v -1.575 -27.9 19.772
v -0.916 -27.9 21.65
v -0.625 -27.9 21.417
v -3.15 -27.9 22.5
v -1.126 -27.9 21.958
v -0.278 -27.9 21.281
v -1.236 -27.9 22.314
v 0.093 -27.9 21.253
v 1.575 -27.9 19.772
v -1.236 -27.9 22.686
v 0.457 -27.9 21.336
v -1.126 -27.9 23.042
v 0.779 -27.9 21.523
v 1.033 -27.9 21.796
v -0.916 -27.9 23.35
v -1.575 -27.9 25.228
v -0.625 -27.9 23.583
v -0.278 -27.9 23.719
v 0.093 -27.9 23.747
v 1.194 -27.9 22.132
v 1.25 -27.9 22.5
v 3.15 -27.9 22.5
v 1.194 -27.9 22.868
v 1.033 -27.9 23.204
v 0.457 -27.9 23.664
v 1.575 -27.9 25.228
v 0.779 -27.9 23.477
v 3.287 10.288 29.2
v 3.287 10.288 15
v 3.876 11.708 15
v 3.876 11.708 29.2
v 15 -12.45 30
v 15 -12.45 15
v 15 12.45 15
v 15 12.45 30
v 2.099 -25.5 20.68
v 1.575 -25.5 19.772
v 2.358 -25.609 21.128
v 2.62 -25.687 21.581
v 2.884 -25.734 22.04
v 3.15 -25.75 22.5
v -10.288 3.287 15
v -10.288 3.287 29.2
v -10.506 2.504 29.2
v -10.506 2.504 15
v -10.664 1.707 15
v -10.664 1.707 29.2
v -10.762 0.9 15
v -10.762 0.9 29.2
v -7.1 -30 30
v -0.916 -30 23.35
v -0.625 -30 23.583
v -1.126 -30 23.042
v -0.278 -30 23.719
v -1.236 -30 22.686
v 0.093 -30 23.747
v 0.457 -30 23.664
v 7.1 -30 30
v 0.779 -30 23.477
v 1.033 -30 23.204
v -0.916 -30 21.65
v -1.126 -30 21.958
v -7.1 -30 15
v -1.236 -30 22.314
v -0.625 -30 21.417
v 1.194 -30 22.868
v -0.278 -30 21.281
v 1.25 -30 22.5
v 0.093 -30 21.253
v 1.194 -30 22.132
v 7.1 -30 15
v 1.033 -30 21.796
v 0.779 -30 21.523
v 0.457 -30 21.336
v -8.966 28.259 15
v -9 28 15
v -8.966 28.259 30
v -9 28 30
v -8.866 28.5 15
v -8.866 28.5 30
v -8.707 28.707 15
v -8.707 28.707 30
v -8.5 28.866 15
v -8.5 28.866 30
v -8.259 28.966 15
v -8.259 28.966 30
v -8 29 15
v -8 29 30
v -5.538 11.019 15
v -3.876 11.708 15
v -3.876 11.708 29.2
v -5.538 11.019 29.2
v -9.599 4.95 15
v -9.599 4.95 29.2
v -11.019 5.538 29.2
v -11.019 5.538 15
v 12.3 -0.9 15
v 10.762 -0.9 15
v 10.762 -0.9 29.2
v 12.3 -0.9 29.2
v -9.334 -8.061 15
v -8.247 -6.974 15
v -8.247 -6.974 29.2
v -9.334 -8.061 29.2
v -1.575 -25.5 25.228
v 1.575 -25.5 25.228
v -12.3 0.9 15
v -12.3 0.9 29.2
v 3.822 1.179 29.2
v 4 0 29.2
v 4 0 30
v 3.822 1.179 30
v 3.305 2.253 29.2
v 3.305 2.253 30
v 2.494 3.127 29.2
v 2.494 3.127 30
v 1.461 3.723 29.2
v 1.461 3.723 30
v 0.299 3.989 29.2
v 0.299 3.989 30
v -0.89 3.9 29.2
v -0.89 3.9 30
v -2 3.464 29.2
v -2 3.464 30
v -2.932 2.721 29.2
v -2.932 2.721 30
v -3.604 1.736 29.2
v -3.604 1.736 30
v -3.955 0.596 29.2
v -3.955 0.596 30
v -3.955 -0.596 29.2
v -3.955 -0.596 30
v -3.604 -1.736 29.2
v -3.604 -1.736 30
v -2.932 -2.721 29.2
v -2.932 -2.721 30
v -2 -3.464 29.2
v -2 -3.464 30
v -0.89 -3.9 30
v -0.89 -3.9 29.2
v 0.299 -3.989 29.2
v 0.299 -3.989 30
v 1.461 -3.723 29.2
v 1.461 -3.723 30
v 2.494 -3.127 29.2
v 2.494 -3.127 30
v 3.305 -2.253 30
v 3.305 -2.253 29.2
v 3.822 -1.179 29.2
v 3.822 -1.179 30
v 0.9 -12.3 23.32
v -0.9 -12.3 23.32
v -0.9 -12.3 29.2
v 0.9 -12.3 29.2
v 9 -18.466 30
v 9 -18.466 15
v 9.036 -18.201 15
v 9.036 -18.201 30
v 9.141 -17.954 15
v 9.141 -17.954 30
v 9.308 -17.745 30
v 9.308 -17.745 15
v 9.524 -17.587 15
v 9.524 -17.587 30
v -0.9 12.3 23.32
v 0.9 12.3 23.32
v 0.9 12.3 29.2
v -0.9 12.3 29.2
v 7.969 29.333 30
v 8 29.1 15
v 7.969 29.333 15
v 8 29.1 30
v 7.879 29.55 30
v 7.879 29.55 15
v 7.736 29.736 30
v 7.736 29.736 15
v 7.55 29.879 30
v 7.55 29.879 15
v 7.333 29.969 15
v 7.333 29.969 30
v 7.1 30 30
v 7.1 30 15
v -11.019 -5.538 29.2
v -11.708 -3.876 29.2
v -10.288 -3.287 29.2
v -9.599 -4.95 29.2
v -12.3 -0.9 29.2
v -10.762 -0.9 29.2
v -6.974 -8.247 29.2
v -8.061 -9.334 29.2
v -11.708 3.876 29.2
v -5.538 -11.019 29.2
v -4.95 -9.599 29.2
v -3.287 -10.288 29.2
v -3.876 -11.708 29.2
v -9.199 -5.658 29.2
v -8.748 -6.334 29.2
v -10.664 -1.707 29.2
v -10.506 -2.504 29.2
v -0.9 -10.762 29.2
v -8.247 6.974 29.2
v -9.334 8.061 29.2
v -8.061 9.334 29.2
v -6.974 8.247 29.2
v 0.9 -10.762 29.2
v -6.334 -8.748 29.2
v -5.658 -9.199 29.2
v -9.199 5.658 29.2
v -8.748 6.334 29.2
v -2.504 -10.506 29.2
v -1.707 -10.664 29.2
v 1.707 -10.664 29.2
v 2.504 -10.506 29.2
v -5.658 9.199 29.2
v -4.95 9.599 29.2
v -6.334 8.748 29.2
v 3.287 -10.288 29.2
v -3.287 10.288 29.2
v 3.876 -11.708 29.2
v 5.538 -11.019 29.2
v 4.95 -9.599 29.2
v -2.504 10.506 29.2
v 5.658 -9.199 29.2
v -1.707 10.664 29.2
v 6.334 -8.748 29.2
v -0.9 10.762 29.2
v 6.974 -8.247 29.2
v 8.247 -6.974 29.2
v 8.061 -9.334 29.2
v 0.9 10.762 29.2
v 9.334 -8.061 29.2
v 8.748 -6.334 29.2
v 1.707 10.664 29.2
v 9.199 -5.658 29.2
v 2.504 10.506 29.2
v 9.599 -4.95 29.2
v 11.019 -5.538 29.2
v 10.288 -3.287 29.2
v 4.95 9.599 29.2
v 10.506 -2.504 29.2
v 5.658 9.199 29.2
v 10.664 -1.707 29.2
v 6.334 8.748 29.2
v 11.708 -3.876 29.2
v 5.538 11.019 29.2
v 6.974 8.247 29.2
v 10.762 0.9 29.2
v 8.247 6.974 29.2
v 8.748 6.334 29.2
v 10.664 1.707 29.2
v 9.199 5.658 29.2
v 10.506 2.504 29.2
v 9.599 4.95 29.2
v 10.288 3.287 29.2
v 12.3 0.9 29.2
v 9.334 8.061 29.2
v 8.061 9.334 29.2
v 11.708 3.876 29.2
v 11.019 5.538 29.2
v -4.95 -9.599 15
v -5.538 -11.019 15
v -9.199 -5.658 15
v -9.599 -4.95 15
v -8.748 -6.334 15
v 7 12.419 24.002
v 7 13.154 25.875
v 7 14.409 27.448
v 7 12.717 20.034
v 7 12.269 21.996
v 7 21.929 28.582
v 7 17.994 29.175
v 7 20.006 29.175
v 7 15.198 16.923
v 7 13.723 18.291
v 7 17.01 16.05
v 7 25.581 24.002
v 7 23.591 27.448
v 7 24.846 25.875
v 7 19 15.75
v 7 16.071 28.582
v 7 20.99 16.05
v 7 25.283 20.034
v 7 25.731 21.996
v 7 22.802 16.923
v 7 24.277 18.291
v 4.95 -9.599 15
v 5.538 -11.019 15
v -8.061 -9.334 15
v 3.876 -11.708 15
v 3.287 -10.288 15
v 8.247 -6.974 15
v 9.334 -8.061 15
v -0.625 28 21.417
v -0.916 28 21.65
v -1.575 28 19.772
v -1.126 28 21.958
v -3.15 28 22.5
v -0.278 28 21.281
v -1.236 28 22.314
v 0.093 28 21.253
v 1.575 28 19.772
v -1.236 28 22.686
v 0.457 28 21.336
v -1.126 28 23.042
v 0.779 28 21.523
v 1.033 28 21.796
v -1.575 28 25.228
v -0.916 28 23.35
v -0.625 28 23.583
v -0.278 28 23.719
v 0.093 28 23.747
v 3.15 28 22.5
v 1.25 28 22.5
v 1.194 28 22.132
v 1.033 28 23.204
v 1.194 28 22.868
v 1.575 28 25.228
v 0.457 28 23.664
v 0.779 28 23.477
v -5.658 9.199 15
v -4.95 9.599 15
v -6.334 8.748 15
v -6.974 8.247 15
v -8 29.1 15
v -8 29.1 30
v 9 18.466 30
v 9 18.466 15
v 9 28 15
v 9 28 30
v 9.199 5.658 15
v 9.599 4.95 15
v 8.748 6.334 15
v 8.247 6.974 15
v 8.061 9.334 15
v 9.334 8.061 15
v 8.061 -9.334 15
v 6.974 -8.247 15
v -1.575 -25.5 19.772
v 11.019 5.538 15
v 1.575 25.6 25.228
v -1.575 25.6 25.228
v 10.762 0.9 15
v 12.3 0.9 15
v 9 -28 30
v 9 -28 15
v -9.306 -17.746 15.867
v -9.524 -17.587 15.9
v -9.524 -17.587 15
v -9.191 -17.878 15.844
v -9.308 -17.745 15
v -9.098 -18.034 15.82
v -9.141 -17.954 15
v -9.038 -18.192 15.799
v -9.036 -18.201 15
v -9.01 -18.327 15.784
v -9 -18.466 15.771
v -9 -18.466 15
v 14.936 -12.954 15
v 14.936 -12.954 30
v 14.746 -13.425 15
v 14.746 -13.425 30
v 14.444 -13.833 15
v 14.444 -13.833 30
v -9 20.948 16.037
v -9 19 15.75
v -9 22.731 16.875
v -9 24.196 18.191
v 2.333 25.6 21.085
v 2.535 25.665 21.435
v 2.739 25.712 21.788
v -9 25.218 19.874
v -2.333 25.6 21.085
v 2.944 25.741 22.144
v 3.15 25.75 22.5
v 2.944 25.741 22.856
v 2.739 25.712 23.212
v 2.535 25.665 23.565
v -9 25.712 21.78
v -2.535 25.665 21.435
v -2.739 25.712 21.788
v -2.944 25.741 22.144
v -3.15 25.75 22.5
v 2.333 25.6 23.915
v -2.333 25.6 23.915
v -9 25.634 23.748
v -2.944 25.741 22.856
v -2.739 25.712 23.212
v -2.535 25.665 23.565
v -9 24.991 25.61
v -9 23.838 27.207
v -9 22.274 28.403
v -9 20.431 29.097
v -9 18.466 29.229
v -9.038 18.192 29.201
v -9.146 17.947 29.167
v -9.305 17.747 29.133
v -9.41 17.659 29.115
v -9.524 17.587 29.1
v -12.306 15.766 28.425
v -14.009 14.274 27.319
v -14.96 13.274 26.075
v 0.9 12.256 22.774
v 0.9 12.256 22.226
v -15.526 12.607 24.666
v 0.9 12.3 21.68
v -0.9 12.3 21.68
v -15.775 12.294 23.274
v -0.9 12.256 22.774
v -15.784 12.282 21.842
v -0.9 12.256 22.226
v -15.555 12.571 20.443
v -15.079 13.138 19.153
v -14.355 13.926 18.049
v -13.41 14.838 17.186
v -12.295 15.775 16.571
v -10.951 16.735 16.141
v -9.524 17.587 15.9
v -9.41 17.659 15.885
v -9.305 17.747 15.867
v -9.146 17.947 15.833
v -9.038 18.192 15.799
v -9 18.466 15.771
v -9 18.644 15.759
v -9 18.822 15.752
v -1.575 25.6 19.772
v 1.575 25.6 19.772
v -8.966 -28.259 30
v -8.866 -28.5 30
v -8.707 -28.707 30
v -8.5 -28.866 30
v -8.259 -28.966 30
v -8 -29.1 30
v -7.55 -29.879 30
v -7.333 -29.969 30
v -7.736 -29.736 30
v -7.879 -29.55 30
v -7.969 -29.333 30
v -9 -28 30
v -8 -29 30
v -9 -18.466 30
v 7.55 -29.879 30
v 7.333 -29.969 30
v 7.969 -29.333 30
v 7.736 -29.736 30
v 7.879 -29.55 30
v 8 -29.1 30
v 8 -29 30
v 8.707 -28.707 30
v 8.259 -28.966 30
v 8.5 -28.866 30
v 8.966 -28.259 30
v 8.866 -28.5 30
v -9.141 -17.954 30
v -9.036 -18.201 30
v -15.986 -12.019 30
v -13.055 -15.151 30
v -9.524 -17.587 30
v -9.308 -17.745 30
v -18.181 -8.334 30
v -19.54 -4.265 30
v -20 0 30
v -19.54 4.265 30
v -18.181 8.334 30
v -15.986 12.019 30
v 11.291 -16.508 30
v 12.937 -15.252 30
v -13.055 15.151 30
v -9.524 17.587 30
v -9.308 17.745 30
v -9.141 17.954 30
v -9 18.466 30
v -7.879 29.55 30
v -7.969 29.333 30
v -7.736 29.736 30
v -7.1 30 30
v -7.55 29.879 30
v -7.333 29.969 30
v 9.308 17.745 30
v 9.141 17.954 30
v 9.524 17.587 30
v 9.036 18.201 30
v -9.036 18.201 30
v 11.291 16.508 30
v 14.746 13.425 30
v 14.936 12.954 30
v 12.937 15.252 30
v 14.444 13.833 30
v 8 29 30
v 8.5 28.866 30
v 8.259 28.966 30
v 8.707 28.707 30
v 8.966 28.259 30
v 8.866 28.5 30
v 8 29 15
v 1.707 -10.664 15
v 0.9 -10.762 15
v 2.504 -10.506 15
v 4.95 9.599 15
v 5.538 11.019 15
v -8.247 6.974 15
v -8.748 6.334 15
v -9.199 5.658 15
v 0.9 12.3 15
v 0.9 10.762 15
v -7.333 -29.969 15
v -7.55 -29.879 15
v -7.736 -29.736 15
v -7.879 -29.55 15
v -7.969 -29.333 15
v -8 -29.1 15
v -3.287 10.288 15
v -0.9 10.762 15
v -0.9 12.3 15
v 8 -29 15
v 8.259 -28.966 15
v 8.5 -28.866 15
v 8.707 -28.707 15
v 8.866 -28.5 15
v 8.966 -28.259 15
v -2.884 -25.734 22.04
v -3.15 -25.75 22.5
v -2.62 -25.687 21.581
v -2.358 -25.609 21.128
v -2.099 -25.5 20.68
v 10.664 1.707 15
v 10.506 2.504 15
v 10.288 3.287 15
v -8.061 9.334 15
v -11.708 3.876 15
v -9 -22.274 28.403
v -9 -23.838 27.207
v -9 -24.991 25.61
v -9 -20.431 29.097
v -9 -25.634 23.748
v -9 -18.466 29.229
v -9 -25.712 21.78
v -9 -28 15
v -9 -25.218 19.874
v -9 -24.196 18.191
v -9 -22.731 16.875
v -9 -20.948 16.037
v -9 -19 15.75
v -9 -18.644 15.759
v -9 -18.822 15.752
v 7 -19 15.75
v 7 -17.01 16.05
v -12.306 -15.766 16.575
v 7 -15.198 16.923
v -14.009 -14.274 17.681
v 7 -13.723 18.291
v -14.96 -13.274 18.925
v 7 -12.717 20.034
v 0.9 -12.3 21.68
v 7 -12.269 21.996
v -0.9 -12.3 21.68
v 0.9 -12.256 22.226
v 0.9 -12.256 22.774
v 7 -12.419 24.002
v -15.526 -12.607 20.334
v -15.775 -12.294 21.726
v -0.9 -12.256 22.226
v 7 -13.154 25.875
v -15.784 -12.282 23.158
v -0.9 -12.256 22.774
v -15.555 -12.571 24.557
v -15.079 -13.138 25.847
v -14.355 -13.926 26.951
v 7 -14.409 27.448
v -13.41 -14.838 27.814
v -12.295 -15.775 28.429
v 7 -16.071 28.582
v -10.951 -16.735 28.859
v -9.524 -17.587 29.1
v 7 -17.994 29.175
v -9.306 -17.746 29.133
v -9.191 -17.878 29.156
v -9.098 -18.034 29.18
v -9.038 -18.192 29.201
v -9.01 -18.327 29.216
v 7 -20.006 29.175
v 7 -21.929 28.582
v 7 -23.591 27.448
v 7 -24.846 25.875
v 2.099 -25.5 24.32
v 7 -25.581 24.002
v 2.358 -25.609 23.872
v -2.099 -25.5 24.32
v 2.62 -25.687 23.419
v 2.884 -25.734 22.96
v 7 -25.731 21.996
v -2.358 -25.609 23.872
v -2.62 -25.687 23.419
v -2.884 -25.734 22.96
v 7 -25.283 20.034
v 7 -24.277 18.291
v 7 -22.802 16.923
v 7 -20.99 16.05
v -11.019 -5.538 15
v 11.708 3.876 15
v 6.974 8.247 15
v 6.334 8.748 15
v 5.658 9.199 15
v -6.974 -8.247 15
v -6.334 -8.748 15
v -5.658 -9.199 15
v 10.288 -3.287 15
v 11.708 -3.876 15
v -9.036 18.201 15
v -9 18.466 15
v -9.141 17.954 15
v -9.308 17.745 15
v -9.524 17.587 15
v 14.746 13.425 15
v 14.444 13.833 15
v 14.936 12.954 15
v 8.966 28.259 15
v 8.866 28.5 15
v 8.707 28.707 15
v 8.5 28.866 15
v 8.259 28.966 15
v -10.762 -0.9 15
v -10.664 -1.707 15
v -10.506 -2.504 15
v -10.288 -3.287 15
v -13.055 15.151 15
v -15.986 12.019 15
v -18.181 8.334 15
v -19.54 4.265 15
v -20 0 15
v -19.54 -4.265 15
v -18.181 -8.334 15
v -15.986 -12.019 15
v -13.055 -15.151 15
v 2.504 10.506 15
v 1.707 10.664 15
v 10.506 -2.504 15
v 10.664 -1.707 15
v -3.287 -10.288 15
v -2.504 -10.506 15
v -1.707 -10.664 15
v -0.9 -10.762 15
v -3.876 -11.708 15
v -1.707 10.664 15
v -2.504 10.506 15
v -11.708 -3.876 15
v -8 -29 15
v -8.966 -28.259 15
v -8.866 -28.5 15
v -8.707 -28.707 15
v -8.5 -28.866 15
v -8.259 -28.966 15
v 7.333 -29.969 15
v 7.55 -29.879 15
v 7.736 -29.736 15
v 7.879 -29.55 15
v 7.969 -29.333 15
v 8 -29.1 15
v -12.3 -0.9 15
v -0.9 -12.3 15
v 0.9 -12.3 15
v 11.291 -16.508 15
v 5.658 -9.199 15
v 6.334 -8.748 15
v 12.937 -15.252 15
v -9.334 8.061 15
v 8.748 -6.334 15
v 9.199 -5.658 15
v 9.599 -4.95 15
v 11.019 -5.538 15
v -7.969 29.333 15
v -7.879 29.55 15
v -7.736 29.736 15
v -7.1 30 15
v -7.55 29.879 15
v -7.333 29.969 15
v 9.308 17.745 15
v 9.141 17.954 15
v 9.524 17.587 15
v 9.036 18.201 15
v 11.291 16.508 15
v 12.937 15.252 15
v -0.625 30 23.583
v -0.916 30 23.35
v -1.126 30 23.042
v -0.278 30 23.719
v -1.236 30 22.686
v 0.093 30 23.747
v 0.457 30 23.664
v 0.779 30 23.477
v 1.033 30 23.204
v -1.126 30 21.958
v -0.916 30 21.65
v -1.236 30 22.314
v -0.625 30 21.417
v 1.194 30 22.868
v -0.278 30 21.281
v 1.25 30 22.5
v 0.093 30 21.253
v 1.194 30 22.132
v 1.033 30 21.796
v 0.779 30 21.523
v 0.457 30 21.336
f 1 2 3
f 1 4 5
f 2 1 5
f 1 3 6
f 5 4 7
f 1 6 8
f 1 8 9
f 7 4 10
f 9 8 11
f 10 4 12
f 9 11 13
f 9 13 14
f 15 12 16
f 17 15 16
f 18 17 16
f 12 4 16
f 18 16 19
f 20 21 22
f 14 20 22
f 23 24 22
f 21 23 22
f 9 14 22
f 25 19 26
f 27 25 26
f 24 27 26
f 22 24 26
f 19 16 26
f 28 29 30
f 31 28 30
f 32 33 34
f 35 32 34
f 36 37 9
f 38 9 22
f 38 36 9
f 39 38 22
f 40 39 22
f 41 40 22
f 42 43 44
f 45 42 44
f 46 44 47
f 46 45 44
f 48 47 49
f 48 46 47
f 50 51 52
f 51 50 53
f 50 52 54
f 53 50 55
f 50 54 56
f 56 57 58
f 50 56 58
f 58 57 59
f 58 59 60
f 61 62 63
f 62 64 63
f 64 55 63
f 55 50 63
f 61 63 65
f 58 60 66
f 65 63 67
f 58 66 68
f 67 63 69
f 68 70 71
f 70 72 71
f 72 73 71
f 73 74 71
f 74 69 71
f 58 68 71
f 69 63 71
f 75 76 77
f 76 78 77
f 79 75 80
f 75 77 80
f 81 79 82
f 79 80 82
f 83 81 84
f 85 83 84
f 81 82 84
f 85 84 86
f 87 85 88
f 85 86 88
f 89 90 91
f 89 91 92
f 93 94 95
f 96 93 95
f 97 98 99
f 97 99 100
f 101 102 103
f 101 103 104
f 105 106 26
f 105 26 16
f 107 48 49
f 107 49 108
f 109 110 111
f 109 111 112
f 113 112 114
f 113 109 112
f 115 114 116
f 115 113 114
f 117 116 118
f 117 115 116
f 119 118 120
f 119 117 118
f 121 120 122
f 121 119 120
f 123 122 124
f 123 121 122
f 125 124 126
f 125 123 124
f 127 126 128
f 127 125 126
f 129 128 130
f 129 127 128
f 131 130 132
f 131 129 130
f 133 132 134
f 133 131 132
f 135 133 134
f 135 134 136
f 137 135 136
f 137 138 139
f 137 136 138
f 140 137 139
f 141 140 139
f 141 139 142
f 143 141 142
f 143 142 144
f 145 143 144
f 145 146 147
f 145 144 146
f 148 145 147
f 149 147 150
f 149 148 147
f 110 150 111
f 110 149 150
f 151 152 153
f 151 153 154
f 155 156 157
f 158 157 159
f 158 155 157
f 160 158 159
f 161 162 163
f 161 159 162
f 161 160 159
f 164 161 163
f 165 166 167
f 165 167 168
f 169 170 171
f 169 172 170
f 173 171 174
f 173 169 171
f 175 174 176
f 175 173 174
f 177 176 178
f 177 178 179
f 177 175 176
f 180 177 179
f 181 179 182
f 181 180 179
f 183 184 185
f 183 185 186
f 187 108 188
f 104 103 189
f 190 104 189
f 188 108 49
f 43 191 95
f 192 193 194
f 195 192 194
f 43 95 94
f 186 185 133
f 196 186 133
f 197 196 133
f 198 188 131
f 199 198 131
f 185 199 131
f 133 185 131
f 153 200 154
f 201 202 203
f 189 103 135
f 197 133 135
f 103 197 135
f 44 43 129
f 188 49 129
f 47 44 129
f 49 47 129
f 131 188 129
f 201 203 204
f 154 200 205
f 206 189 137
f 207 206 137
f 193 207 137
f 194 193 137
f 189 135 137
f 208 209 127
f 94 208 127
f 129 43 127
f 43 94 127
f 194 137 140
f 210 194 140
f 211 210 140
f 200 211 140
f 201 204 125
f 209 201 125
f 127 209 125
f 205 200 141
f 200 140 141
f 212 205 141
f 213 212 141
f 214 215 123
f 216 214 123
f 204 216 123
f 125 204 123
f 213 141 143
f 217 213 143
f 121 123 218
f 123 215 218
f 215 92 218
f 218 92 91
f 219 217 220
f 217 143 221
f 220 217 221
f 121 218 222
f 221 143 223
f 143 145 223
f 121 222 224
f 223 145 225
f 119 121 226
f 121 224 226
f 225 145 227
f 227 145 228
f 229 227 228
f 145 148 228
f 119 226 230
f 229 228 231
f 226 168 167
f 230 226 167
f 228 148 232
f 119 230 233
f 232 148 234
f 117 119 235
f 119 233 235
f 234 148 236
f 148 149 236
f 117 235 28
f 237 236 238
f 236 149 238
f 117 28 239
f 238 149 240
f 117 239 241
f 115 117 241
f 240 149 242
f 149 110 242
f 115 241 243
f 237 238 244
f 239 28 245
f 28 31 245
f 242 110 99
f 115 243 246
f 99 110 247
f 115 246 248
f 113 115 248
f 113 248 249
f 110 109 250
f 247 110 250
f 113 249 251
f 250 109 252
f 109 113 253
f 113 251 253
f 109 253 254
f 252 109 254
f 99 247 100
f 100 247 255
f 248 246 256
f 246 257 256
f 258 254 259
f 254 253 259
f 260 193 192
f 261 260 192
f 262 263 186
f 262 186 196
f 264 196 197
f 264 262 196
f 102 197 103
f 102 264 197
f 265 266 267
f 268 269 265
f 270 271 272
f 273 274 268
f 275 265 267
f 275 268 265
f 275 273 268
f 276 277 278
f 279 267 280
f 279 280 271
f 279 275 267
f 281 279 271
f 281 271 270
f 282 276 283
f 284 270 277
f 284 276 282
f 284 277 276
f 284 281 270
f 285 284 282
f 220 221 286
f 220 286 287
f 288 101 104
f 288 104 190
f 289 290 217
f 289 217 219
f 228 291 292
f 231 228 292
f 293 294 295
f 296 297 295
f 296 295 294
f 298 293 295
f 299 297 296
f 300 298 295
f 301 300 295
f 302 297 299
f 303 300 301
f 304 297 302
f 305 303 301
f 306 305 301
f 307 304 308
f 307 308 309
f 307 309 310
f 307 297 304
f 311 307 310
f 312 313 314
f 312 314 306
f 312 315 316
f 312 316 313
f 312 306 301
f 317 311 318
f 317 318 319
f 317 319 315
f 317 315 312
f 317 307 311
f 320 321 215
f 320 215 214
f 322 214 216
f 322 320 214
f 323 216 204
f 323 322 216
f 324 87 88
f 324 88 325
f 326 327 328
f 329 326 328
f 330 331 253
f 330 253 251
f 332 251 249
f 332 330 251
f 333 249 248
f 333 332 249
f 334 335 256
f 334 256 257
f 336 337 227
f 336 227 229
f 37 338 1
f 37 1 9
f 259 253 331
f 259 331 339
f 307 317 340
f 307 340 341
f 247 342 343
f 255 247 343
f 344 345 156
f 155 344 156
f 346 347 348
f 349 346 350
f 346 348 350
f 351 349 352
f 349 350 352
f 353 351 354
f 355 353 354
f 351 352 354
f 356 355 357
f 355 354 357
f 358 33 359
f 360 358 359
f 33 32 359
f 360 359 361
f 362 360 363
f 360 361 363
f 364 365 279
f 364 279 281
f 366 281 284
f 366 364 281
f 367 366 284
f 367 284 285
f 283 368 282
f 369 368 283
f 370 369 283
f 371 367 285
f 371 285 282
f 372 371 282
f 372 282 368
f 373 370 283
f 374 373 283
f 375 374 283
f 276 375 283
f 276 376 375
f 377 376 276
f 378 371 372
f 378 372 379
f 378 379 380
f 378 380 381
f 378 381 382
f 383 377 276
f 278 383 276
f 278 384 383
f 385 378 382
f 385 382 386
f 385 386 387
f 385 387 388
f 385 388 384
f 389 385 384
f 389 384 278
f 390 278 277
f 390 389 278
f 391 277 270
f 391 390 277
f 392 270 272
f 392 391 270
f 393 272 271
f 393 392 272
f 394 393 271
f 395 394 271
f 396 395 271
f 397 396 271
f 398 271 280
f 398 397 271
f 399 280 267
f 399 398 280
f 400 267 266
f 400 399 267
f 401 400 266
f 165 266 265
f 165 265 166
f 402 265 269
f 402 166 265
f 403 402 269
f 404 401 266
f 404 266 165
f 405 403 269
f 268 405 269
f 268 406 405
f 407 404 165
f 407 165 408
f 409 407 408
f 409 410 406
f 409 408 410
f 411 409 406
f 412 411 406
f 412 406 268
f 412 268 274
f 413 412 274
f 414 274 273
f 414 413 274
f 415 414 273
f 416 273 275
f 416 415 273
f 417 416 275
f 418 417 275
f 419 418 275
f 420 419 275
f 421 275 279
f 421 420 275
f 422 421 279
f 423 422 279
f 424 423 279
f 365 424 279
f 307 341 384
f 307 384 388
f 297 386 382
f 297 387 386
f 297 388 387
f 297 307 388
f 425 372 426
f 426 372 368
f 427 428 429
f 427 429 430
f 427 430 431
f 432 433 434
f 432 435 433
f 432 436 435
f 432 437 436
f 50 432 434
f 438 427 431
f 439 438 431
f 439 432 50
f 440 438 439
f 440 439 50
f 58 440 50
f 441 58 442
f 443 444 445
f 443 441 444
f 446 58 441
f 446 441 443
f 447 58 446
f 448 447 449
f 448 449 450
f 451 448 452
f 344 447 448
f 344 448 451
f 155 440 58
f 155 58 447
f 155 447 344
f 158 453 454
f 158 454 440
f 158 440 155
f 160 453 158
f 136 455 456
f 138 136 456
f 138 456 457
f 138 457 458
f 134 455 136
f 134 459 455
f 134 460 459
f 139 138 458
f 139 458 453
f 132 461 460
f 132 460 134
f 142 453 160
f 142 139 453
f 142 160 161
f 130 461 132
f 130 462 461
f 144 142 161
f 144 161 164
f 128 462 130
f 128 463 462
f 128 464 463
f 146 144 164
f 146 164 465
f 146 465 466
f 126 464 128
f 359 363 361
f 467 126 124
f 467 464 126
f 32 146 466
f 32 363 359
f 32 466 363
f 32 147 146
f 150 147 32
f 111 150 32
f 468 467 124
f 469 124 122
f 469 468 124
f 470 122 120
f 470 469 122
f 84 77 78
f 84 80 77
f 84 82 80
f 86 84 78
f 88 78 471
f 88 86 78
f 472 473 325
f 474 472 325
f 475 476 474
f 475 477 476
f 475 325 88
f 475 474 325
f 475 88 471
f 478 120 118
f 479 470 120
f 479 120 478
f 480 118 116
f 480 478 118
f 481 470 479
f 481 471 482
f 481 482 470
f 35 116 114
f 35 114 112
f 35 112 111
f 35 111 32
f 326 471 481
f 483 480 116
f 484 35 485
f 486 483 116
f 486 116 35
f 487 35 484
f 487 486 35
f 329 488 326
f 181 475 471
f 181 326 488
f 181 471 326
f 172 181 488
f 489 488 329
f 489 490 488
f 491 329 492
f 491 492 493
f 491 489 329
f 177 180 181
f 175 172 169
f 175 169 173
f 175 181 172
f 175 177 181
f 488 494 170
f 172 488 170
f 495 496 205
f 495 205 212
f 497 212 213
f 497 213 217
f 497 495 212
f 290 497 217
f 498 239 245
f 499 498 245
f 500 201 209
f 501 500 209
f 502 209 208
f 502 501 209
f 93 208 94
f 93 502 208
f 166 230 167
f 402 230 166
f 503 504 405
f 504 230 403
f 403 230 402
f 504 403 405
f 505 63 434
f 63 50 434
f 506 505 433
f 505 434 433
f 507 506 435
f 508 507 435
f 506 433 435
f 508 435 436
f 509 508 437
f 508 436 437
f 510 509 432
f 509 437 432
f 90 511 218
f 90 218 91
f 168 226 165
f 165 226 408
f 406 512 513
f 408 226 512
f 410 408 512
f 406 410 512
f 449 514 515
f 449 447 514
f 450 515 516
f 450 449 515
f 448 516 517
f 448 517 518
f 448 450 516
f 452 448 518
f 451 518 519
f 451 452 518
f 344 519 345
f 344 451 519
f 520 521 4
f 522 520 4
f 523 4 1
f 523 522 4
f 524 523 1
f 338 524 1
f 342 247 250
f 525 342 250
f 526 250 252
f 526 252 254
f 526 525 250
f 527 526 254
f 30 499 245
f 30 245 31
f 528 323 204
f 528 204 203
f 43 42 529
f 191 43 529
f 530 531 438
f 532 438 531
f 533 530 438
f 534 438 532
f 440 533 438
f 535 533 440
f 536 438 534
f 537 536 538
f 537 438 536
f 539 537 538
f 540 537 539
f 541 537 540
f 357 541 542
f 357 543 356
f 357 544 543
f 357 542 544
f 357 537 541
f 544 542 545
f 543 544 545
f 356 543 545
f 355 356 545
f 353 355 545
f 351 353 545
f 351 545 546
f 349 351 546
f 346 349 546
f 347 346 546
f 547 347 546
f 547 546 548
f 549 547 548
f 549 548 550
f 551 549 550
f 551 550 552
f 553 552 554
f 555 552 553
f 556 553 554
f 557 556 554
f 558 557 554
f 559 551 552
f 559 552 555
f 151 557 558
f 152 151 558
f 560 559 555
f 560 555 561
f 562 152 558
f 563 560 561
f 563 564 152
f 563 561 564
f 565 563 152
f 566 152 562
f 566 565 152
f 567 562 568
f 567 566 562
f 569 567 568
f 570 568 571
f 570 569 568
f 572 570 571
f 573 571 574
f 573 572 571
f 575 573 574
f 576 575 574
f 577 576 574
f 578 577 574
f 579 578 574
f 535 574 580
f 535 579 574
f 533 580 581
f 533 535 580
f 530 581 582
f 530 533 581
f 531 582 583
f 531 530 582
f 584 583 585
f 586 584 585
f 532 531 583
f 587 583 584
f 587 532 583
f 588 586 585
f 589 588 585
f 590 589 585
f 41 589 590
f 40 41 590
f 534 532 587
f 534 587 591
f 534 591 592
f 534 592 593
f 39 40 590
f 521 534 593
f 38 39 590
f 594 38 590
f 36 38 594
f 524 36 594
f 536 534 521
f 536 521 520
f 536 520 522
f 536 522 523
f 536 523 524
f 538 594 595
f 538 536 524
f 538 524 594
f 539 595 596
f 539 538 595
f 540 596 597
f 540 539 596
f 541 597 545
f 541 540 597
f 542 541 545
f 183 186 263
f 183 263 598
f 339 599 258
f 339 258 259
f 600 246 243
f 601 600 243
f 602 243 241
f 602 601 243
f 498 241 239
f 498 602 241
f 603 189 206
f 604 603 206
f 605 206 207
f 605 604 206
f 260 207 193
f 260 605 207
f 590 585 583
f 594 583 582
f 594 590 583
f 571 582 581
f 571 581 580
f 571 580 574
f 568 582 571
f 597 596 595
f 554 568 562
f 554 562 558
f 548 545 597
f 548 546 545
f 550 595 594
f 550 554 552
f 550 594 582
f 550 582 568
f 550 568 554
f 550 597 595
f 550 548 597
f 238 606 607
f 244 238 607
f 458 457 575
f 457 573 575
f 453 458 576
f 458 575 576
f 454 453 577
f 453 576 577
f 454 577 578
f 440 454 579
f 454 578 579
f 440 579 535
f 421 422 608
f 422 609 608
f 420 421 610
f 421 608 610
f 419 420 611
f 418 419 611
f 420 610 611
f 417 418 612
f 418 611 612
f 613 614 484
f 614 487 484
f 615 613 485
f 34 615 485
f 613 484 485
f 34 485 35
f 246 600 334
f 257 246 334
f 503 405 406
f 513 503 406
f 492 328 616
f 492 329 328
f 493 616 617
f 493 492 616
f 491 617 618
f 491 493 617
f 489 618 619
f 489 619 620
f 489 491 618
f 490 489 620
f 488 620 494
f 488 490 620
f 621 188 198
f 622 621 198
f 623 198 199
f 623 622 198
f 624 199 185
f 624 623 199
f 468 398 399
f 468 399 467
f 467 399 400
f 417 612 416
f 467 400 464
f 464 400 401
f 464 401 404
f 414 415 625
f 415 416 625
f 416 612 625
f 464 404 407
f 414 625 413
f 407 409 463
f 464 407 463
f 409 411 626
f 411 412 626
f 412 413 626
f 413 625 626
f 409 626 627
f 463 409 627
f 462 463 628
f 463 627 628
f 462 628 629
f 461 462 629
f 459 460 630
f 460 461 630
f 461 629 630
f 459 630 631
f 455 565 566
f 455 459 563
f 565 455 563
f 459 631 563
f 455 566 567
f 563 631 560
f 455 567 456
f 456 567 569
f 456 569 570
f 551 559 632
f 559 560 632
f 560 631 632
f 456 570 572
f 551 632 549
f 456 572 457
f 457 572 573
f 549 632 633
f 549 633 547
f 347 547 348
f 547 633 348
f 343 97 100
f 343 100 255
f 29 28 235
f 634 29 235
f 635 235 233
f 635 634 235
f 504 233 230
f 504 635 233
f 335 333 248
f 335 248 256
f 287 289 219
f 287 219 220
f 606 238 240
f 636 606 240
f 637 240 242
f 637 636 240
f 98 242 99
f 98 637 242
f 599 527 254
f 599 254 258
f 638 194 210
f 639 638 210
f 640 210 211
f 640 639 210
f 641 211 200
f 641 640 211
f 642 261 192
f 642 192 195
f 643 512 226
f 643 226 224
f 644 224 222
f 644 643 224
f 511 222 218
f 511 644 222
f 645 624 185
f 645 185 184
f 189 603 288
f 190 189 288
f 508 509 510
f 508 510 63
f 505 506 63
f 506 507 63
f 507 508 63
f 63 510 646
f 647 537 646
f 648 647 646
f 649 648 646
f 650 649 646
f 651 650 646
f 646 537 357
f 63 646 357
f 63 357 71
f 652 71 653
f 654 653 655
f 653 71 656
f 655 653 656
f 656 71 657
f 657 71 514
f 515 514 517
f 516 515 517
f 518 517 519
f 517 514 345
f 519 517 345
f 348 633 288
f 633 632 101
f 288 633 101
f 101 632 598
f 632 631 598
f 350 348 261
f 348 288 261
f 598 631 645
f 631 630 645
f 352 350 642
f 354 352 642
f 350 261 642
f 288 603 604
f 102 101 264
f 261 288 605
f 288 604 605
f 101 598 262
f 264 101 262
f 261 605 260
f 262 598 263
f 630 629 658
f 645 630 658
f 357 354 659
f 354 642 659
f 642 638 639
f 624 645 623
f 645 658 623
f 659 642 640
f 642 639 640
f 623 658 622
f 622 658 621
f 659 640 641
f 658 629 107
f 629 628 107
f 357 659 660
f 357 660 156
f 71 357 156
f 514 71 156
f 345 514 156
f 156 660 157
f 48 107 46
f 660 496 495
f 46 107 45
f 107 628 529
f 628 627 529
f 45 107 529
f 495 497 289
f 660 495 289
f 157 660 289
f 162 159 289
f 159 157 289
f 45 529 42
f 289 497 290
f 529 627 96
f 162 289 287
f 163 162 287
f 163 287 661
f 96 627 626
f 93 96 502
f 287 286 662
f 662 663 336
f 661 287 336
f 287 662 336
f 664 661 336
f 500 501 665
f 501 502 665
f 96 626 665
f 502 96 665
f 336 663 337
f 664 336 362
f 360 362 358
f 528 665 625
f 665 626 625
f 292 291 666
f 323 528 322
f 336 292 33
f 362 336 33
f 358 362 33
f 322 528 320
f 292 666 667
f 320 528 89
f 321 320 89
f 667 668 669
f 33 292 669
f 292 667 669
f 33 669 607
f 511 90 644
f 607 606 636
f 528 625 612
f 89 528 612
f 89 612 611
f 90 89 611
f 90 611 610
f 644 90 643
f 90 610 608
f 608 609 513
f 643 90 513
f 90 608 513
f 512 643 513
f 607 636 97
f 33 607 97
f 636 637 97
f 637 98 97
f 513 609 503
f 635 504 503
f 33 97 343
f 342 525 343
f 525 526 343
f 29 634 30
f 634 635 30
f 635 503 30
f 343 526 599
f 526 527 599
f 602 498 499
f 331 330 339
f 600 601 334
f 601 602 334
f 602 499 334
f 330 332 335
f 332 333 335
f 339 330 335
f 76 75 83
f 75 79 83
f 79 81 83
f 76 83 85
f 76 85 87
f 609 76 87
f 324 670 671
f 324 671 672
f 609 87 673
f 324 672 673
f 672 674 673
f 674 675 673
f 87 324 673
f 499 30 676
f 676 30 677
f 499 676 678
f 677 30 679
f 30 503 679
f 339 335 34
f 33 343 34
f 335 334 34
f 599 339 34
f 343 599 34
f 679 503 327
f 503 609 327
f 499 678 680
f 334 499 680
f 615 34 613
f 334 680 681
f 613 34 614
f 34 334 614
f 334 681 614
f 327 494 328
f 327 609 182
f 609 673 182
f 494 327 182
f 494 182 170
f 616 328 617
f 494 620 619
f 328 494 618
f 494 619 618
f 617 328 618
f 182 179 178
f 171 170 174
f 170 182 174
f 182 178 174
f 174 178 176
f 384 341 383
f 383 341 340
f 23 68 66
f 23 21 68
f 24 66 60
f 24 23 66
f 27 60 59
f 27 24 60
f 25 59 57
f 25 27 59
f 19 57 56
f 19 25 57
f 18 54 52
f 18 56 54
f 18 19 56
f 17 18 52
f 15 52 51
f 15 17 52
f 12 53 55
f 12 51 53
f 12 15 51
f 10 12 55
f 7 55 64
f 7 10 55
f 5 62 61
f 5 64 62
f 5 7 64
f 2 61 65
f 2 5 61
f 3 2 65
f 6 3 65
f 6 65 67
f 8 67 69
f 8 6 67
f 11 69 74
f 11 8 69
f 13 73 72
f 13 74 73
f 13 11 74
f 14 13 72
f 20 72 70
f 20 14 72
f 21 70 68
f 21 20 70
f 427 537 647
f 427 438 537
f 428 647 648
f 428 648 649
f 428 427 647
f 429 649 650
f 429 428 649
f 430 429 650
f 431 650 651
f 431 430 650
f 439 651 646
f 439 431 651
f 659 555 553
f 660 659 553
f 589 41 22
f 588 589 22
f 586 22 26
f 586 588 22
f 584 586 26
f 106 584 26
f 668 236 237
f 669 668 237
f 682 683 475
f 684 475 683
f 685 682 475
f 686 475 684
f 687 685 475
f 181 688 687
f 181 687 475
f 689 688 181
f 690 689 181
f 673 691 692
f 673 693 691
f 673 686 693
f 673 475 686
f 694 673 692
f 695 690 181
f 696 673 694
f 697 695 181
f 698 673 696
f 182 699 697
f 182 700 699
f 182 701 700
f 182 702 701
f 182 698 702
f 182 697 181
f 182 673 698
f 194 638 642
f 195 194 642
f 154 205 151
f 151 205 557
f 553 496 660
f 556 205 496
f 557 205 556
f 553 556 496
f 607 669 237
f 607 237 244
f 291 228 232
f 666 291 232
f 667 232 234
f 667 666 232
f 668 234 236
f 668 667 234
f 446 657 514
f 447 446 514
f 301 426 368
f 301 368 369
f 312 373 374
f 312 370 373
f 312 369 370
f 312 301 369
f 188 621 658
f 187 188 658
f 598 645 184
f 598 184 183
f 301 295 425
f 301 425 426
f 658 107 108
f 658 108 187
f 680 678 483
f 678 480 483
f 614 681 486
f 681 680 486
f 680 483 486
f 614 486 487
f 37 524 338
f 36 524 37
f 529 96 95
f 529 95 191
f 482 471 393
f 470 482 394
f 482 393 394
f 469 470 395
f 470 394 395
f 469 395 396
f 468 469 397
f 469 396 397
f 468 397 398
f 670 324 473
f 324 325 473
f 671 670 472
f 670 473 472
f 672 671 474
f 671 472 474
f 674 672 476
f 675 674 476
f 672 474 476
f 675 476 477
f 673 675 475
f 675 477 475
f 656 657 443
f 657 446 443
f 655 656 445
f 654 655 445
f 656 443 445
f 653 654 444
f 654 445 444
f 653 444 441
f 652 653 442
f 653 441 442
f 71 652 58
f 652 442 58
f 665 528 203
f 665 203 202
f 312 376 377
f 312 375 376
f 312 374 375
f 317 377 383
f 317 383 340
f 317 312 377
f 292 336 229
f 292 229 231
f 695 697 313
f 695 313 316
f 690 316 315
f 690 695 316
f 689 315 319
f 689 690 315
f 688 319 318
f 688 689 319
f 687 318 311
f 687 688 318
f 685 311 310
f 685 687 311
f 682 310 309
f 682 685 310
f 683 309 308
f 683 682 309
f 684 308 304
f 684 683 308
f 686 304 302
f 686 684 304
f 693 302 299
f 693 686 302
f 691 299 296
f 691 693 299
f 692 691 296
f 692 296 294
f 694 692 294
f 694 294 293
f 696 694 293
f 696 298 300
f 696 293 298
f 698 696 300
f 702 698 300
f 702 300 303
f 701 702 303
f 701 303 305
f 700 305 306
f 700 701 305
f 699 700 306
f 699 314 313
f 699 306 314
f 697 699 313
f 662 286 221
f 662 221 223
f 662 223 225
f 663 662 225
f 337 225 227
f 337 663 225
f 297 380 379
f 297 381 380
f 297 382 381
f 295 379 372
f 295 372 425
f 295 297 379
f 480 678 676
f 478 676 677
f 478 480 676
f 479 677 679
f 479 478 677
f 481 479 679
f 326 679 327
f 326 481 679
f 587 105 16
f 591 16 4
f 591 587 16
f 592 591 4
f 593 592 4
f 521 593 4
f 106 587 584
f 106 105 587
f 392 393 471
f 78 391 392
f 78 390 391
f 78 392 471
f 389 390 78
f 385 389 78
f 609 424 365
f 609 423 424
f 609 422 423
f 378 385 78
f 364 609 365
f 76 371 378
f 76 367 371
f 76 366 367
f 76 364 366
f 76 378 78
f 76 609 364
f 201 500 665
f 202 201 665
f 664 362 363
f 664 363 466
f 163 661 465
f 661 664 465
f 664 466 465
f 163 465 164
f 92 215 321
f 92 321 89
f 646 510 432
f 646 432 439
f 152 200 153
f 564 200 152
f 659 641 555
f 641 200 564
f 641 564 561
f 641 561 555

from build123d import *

# Parameters (mm, degrees)
CYLINDER060_R     = 4
CYLINDER060_DEPTH = 10
BOX018_W          = 6.3
BOX018_H          = 1.8
BOX018_DEPTH      = 14.2
ARRAY003_COUNT    = 16
CYLINDER056_R     = 10.8
CYLINDER056_DEPTH = 14.2
BOX015_W          = 14
BOX015_H          = 54
BOX015_DEPTH      = 15
BOX016_W          = 40
BOX016_H          = 40
BOX016_DEPTH      = 10
PRISM008_DEPTH    = 2.4
PRISM001_DEPTH    = 2.4
CYLINDER012_R     = 1.25
CYLINDER012_DEPTH = 50
CYLINDER011_R     = 1.25
CYLINDER011_DEPTH = 50
CYLINDER007_R     = 6.75
CYLINDER007_DEPTH = 50
CYLINDER008_R     = 6.75
CYLINDER008_DEPTH = 50
BOX013_W          = 18
BOX013_H          = 18
BOX013_DEPTH      = 15
BOX003_W          = 18
BOX003_H          = 18
BOX003_DEPTH      = 15
CYLINDER004_R     = 11.2
CYLINDER004_DEPTH = 23
CYLINDER002_R     = 0.9
CYLINDER002_DEPTH = 19.75
ARRAY002_COUNT    = 10
CYLINDER006_R     = 10.5
CYLINDER006_DEPTH = 32
CYLINDER005_R     = 20
CYLINDER005_DEPTH = 15
FILLET003_R       = 1
CYLINDER051_R     = 1.25
CYLINDER051_DEPTH = 50
BOX011_W          = 16
BOX011_H          = 1
BOX011_DEPTH      = 15
CYLINDER052_R     = 1.25
CYLINDER052_DEPTH = 50
BOX012_W          = 16
BOX012_H          = 1
BOX012_DEPTH      = 15
FILLET010_R       = 0.9
CYLINDER053_R     = 10.5
CYLINDER053_DEPTH = 15
PAD_DEPTH         = 50
BOX014_W          = 10
BOX014_H          = 54
BOX014_DEPTH      = 15
FILLET011_R       = 2


with BuildPart() as cylinder055:
    # Cylinder060 → Cylinder060 (new body)
    with BuildSketch(Plane.XY.offset(21.7)):
        Circle(CYLINDER060_R)
    extrude(amount=CYLINDER060_DEPTH)


with BuildPart() as array003:
    # Box018 → Box018 (new body)
    with BuildSketch(Plane(origin=(6, -0.9, 15), x_dir=(1, 0, 0), z_dir=(0, 0, 1))):
        with Locations((3.15, 0.9)):
            Rectangle(BOX018_W, BOX018_H)
    extrude(amount=BOX018_DEPTH)

    # Array003: Array003 ×16 about axis
    array003_axis = Axis((0, 0, 0), (0, 0, 1))


with BuildPart() as array003_1:
    add(array003.part)
    for i in range(1, ARRAY003_COUNT):
        add(array003.part.rotate(array003_axis, i * 360 / ARRAY003_COUNT))


with BuildPart() as fusion020:
    # Cylinder056 → Cylinder056 (new body)
    with BuildSketch(Plane.XY.offset(15)):
        Circle(CYLINDER056_R)
    extrude(amount=CYLINDER056_DEPTH)

    # Fusion020: union Array003
    add(array003_1.part)


with BuildPart() as cube015:
    # Box015 → Box015 (new body)
    with BuildSketch(Plane(origin=(15, -27, 15), x_dir=(1, 0, 0), z_dir=(0, 0, 1))):
        with Locations((7, 27)):
            Rectangle(BOX015_W, BOX015_H)
    extrude(amount=BOX015_DEPTH)


with BuildPart() as cube016:
    # Box016 → Box016 (new body)
    with BuildSketch(Plane(origin=(-20, -20, 5), x_dir=(1, 0, 0), z_dir=(0, 0, 1))):
        with Locations((20, 20)):
            Rectangle(BOX016_W, BOX016_H)
    extrude(amount=BOX016_DEPTH)


with BuildPart() as prism008:
    # Prism008 → Prism008 (new body)
    with BuildSketch(Plane(origin=(0, 28, 22.5), x_dir=(1, 0, 0), z_dir=(0, -1, 0))):
        Polygon((3.15, 0), (1.575, 2.72798), (-1.575, 2.72798), (-3.15, 0), (-1.575, -2.72798), (1.575, -2.72798), align=None)
    extrude(amount=PRISM008_DEPTH)


with BuildPart() as prism001:
    # Prism001 → Prism001 (new body)
    with BuildSketch(Plane(origin=(0, -25.5, 22.5), x_dir=(1, 0, 0), z_dir=(0, -1, 0))):
        Polygon((3.15, 0), (1.575, 2.72798), (-1.575, 2.72798), (-3.15, 0), (-1.575, -2.72798), (1.575, -2.72798), align=None)
    extrude(amount=PRISM001_DEPTH)


with BuildPart() as cylinder011:
    # Cylinder012 → Cylinder012 (new body)
    with BuildSketch(Plane(origin=(0, 69, 22.5), x_dir=(1, 0, 0), z_dir=(0, -1, 0))):
        Circle(CYLINDER012_R)
    extrude(amount=CYLINDER012_DEPTH)


with BuildPart() as cylinder010:
    # Cylinder011 → Cylinder011 (new body)
    with BuildSketch(Plane(origin=(0, -16, 22.5), x_dir=(1, 0, 0), z_dir=(0, -1, 0))):
        Circle(CYLINDER011_R)
    extrude(amount=CYLINDER011_DEPTH)


with BuildPart() as cylinder007:
    # Cylinder007 → Cylinder007 (new body)
    with BuildSketch(Plane(origin=(-24, 19, 22.5), x_dir=(0, 0, -1), z_dir=(1, 0, 0))):
        Circle(CYLINDER007_R)
    extrude(amount=CYLINDER007_DEPTH)


with BuildPart() as cylinder008:
    # Cylinder008 → Cylinder008 (new body)
    with BuildSketch(Plane(origin=(-24, -19, 22.5), x_dir=(0, 0, -1), z_dir=(1, 0, 0))):
        Circle(CYLINDER008_R)
    extrude(amount=CYLINDER008_DEPTH)


with BuildPart() as cube013:
    # Box013 → Box013 (new body)
    with BuildSketch(Plane(origin=(-9, -29, 15), x_dir=(1, 0, 0), z_dir=(0, 0, 1))):
        with Locations((9, 9)):
            Rectangle(BOX013_W, BOX013_H)
    extrude(amount=BOX013_DEPTH)


with BuildPart() as cube003:
    # Box003 → Box003 (new body)
    with BuildSketch(Plane(origin=(-9, 11, 15), x_dir=(1, 0, 0), z_dir=(0, 0, 1))):
        with Locations((9, 9)):
            Rectangle(BOX003_W, BOX003_H)
    extrude(amount=BOX003_DEPTH)


with BuildPart() as cylinder004:
    # Cylinder004 → Cylinder004 (new body)
    with BuildSketch(Plane.XY):
        Circle(CYLINDER004_R)
    extrude(amount=CYLINDER004_DEPTH)


with BuildPart() as aspas:
    # Cylinder002 → Cylinder002 (new body)
    with BuildSketch(Plane(origin=(0, 0, 15), x_dir=(0, 0, -1), z_dir=(1, 0, 0))):
        Circle(CYLINDER002_R)
    extrude(amount=CYLINDER002_DEPTH)

    # Array002: aspas ×10 about axis
    array002_axis = Axis((0, 0, 0), (0, 0, 1))


with BuildPart() as aspas_1:
    add(aspas.part)
    for i in range(1, ARRAY002_COUNT):
        add(aspas.part.rotate(array002_axis, i * 360 / ARRAY002_COUNT))

    # Cut002: cut Cylinder004
    add(cylinder004.part, mode=Mode.SUBTRACT)


with BuildPart() as cylinder006:
    # Cylinder006 → Cylinder006 (new body)
    with BuildSketch(Plane.XY):
        Circle(CYLINDER006_R)
    extrude(amount=CYLINDER006_DEPTH)


with BuildPart() as final_soporte_inferior_estante11:
    # Cylinder005 → Cylinder005 (new body)
    with BuildSketch(Plane.XY.offset(15)):
        Circle(CYLINDER005_R)
    extrude(amount=CYLINDER005_DEPTH)

    # Cut004: cut Cylinder006
    add(cylinder006.part, mode=Mode.SUBTRACT)

    # Fusion001: union aspas
    add(aspas_1.part)

    # Fusion002: union Cube013, Cube003
    add(cube013.part)
    add(cube003.part)

    # Cut005: cut Cylinder008
    add(cylinder008.part, mode=Mode.SUBTRACT)

    # Cut006: cut Cylinder007
    add(cylinder007.part, mode=Mode.SUBTRACT)

    # Fillet003
    fillet003_edges = [final_soporte_inferior_estante11.edges().sort_by_distance(p)[0] for p in [
        (-9, -17.860571, 29.576567),
        (-9, -17.860571, 15.423433),
        (-9, -29, 22.5),
        (-9, 17.860571, 15.423433),
        (-9, 17.860571, 29.576567),
        (9, -29, 22.5),
        (9, -17.860571, 29.576567),
        (9, -17.860571, 15.423433),
        (9, 17.860571, 29.576567),
        (9, 17.860571, 15.423433),
        (9, 29, 22.5),
        (-9, 29, 22.5),
    ]]
    fillet(fillet003_edges, radius=FILLET003_R)

    # Cut008: cut Cylinder010
    add(cylinder010.part, mode=Mode.SUBTRACT)

    # Cut009: cut Cylinder011
    add(cylinder011.part, mode=Mode.SUBTRACT)

    # Cut035: cut Prism001
    add(prism001.part, mode=Mode.SUBTRACT)

    # Cut036: cut Prism008
    add(prism008.part, mode=Mode.SUBTRACT)


with BuildPart() as cylinder049:
    # Cylinder051 → Cylinder051 (new body)
    with BuildSketch(Plane(origin=(0, 69, 22.5), x_dir=(1, 0, 0), z_dir=(0, -1, 0))):
        Circle(CYLINDER051_R)
    extrude(amount=CYLINDER051_DEPTH)


with BuildPart() as cut037:
    # Box011 → Box011 (new body)
    with BuildSketch(Plane(origin=(-8, 29, 15), x_dir=(1, 0, 0), z_dir=(0, 0, 1))):
        with Locations((8, 0.5)):
            Rectangle(BOX011_W, BOX011_H)
    extrude(amount=BOX011_DEPTH)

    # Cut037: cut Cylinder049
    add(cylinder049.part, mode=Mode.SUBTRACT)


with BuildPart() as cylinder021:
    # Cylinder052 → Cylinder052 (new body)
    with BuildSketch(Plane(origin=(0, 69, 22.5), x_dir=(1, 0, 0), z_dir=(0, -1, 0))):
        Circle(CYLINDER052_R)
    extrude(amount=CYLINDER052_DEPTH)


with BuildPart() as final_soporte_inferior_estante1:
    # Box012 → Box012 (new body)
    with BuildSketch(Plane(origin=(-8, 29, 15), x_dir=(1, 0, 0), z_dir=(0, 0, 1))):
        with Locations((8, 0.5)):
            Rectangle(BOX012_W, BOX012_H)
    extrude(amount=BOX012_DEPTH)

    # Cut038: cut Cylinder021
    add(cylinder021.part, mode=Mode.SUBTRACT)


with BuildPart() as final_soporte_inferior_estante1_1:
    # Cut038 placement: moved
    add(final_soporte_inferior_estante1.part.moved(Location((0, -59, 0))))

    # Fusion017: union final_soporte_inferior_estante11, Cut037
    add(final_soporte_inferior_estante11.part)
    add(cut037.part)

    # Fillet010
    fillet010_edges = [final_soporte_inferior_estante1_1.edges().sort_by_distance(p)[0] for p in [
        (-8, -30, 22.5),
        (8, -30, 22.5),
        (-8, 30, 22.5),
        (8, 30, 22.5),
    ]]
    fillet(fillet010_edges, radius=FILLET010_R)


with BuildPart() as cylinder050:
    # Cylinder053 → Cylinder053 (new body)
    with BuildSketch(Plane.XY.offset(15)):
        Circle(CYLINDER053_R)
    extrude(amount=CYLINDER053_DEPTH)


with BuildPart() as body:
    # CopySketch → Pad (new body)
    with BuildSketch(Plane(origin=(0, 0, 15), x_dir=(1, 0, 0), z_dir=(0, 0, -1))):
        with BuildLine():
            Line((9, 28), (9, 18.466185))
            ThreePointArc((9, 18.466185), (9.140875, 17.954419), (9.52381, 17.586843))
            ThreePointArc((9.52381, -17.586843), (20, 0), (9.52381, 17.586843))
            ThreePointArc((9.52381, -17.586843), (9.140875, -17.954419), (9, -18.466185))
            Line((9, -18.466185), (9, -28))
            Line((27.474319, -28), (9, -28))
            Line((27.474319, 28), (27.474319, -28))
            Line((9, 28), (27.474319, 28))
        make_face()
    extrude(amount=PAD_DEPTH)


with BuildPart() as body_1:
    # Body placement: moved
    add(body.part.moved(Location((0, 0, 25))))


with BuildPart() as extremo_microfono_done:
    # Box014 → Box014 (new body)
    with BuildSketch(Plane(origin=(7, -27, 15), x_dir=(1, 0, 0), z_dir=(0, 0, 1))):
        with Locations((5, 27)):
            Rectangle(BOX014_W, BOX014_H)
    extrude(amount=BOX014_DEPTH)

    # Cut039: cut Body
    add(body_1.part, mode=Mode.SUBTRACT)

    # Fusion018: union Cylinder050
    add(cylinder050.part)

    # Fusion019: union final_soporte_inferior_estante1
    add(final_soporte_inferior_estante1_1.part)

    # Cut040: cut Cube016
    add(cube016.part, mode=Mode.SUBTRACT)

    # Cut041: cut Cube015
    add(cube015.part, mode=Mode.SUBTRACT)

    # Fillet011
    fillet011_edges = [extremo_microfono_done.edges().sort_by_distance(p)[0] for p in [
        (15, 13.228757, 28.000375),
        (15, 13.228757, 22.5),
        (15, 13.228757, 16.999625),
        (15, -13.228757, 16.999625),
        (15, -13.228757, 22.5),
        (15, -13.228757, 28.000375),
    ]]
    fillet(fillet011_edges, radius=FILLET011_R)

    # Cut042: cut Fusion020
    add(fusion020.part, mode=Mode.SUBTRACT)

    # Cut045: cut Cylinder055
    add(cylinder055.part, mode=Mode.SUBTRACT)


solid = extremo_microfono_done.part
